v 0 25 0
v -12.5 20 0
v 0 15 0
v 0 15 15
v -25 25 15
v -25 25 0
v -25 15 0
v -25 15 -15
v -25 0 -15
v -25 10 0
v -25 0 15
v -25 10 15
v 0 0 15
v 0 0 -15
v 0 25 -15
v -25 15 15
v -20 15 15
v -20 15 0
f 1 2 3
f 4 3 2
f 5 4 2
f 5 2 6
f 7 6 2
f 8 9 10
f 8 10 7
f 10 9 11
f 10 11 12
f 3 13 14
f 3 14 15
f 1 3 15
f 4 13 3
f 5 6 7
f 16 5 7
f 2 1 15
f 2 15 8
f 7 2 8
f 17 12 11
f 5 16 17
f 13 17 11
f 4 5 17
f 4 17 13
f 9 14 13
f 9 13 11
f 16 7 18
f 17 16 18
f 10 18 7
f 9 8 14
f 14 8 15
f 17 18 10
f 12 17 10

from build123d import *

# Parameters (mm, degrees)
BOSS_EXTRUDE1_DEPTH = 15
BOSS_EXTRUDE2_DEPTH = 15
SKETCH6_W           = 25
SKETCH6_H           = 15
BOSS_EXTRUDE7_DEPTH = 15
BOSS_EXTRUDE8_DEPTH = 15


with BuildPart() as part:
    # Sketch1 → Boss-Extrude1 (new body)
    with BuildSketch(Plane.XY):
        Polygon((-25, 0), (0, 0), (0, 15), (-20, 15), (-25, 10), align=None)
    extrude(amount=BOSS_EXTRUDE1_DEPTH)

    # Sketch2 → Boss-Extrude2 (add)
    with BuildSketch(Plane(origin=(0, 0, 0), x_dir=(-1, 0, 0), z_dir=(0, 0, -1))):
        Polygon((25, 25), (25, 15), (0, 15), align=None)
    extrude(amount=-BOSS_EXTRUDE2_DEPTH)



with BuildPart() as body_2:
    # Sketch6 → Boss-Extrude7 (new body)
    with BuildSketch(Plane(origin=(0, 0, 0), x_dir=(-1, 0, 0), z_dir=(0, 0, -1))):
        with Locations((12.5, 7.5)):
            Rectangle(SKETCH6_W, SKETCH6_H)
    extrude(amount=BOSS_EXTRUDE7_DEPTH)


with BuildPart() as part_1:
    add(part.part)

    add(body_2.part)  # Boss-Extrude8 merges body 2
    # Sketch7 → Boss-Extrude8 (add)
    with BuildSketch(Plane(origin=(0, 0, 0), x_dir=(-1, 0, 0), z_dir=(0, 0, -1))):
        Polygon((0, 15), (0, 25), (25, 15), align=None)
    extrude(amount=BOSS_EXTRUDE8_DEPTH)


solid = part_1.part
